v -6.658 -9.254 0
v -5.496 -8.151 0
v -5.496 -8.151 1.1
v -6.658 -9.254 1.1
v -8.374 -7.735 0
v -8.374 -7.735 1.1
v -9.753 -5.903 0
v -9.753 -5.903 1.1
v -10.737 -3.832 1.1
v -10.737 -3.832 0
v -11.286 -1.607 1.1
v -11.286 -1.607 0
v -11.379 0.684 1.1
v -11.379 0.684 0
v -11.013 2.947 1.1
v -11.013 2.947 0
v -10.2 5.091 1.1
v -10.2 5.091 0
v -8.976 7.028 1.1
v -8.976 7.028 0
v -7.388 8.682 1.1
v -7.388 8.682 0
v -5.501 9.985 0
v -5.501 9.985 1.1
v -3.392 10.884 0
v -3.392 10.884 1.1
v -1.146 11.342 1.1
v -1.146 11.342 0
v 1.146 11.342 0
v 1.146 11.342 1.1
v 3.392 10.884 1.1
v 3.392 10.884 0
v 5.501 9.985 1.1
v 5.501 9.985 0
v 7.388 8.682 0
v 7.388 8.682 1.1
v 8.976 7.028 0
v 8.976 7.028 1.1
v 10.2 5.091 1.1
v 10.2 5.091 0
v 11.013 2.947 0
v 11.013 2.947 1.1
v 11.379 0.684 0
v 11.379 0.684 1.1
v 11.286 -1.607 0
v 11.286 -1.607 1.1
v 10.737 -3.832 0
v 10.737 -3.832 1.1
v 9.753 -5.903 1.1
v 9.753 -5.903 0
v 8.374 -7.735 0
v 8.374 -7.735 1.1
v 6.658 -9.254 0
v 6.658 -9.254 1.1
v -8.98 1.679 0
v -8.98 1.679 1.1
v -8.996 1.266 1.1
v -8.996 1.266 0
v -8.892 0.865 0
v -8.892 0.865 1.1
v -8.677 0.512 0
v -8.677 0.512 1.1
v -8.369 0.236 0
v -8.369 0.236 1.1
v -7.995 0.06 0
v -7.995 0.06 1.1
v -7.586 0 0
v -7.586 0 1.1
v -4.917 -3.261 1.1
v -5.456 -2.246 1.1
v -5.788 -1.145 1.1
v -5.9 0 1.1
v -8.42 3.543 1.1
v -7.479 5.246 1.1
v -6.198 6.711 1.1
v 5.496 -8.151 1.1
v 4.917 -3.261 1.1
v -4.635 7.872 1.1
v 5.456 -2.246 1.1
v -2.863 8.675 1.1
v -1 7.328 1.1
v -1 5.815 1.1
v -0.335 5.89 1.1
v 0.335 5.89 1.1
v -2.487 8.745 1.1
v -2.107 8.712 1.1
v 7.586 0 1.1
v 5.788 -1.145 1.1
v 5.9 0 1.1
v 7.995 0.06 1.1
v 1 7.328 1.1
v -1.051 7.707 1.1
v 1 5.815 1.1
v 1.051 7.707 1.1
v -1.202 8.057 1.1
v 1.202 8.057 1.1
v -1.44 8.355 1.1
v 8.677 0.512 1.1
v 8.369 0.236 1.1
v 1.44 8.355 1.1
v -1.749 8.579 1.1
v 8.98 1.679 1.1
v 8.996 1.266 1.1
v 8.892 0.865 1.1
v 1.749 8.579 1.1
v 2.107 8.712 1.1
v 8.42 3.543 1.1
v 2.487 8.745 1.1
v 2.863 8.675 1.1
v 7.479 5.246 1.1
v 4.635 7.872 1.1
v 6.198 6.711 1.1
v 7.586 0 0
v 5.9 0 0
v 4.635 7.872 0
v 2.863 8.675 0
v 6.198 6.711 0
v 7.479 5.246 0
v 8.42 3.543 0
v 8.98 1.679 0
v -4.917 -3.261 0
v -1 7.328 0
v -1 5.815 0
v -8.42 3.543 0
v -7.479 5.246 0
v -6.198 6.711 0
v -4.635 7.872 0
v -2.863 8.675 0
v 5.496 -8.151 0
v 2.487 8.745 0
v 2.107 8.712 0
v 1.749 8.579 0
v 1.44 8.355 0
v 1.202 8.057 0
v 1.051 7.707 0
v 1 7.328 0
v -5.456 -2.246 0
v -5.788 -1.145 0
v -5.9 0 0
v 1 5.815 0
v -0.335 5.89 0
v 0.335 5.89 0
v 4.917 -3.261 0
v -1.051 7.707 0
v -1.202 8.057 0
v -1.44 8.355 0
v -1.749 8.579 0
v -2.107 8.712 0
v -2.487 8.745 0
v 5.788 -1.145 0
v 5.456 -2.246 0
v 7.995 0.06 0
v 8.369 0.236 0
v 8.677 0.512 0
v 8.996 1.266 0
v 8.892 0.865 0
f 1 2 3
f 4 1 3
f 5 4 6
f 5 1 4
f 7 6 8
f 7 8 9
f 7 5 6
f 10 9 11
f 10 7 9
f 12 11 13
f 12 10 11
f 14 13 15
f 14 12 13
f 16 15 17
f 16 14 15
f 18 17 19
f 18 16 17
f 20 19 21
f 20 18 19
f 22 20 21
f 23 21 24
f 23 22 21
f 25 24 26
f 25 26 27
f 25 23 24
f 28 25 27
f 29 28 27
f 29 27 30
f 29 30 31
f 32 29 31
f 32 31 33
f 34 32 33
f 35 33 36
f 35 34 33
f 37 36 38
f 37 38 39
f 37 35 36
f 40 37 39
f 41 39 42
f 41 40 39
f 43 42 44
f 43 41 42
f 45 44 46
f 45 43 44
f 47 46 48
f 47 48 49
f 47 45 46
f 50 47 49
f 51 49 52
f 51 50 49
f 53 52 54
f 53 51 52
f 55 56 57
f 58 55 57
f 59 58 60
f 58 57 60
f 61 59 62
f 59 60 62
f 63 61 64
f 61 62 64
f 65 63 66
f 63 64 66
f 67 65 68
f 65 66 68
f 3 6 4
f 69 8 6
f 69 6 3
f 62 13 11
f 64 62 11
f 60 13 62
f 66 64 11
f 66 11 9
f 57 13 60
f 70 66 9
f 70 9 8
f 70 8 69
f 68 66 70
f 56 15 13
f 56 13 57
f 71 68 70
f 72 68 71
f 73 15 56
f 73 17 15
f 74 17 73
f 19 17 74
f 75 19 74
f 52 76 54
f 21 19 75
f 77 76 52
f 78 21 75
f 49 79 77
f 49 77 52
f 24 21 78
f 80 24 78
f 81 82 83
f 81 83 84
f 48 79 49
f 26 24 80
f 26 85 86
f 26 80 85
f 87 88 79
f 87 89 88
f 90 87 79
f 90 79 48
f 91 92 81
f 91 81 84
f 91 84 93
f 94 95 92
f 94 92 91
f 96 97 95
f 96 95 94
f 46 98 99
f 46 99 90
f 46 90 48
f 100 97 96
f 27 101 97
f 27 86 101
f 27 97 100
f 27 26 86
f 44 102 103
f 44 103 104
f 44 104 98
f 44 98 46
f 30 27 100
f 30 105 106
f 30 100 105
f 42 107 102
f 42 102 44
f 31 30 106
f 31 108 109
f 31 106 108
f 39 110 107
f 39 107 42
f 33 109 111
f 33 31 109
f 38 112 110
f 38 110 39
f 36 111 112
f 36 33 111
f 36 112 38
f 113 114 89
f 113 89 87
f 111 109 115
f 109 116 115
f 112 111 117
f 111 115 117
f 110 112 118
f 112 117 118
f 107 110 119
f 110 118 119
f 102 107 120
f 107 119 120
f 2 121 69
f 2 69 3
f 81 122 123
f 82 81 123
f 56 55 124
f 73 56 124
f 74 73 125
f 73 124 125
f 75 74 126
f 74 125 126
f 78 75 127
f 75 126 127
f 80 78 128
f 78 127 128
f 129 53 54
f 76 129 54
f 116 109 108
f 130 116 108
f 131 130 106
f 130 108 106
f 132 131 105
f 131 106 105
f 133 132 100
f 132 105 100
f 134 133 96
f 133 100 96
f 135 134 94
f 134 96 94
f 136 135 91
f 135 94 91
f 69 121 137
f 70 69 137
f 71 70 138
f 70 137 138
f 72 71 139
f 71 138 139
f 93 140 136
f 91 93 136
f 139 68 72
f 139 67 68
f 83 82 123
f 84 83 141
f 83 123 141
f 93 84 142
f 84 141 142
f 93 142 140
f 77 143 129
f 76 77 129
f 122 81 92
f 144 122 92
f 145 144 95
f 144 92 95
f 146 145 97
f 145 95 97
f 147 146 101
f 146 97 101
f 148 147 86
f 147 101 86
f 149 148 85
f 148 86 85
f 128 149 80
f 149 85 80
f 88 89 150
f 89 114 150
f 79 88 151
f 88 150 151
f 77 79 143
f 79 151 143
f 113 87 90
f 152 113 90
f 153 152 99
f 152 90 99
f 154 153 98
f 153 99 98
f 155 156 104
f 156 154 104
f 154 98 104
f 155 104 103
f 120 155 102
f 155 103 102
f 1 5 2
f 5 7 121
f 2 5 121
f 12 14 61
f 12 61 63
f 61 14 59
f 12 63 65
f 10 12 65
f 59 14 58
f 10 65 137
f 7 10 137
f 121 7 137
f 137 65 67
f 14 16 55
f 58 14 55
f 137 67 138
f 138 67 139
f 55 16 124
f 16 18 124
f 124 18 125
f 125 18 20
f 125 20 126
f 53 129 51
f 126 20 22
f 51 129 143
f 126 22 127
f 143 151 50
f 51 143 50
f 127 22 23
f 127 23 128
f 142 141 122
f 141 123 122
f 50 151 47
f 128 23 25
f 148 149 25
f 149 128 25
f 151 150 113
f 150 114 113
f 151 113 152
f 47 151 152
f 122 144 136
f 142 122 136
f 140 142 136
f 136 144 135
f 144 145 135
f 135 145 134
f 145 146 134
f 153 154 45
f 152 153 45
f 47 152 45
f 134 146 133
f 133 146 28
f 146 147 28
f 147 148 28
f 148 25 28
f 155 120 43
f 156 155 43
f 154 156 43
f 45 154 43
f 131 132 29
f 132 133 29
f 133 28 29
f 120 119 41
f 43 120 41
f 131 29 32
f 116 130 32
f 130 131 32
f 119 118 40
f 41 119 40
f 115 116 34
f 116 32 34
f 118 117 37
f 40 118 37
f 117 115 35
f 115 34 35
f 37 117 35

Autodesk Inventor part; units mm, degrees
ref_plane "YZ Plane" through (0, 0, 0) normal (1, 0, 0) x (0, 1, 0)
ref_plane "XZ Plane" through (0, 0, 0) normal (0, 1, 0) x (-1, 0, 0)
ref_plane "XY Plane" through (0, 0, 0) normal (0, 0, 1) x (1, 0, 0)
sketch "Sketch1" plane through (0, 0, 0) normal (0, 0, 1) x (1, 0, 0)
  point P0 (0, 0)
sketch "Sketch2" plane through (0, 0, 0) normal (0, 0, 1) x (1, 0, 0)
  line L0 (-9.1353, 0) -> (-5.9, 0)
  arc A0 (-1, 9.0804) -> (-9.1353, 0) centre (0, 0) ccw
  line L1 (-1, 9.0804) -> (-1, 5.8146)
  arc A1 (1, 5.8146) -> (-1, 5.8146) centre (0, 0) ccw
  line L2 (1, 5.8146) -> (1, 9.0804)
  arc A2 (9.1353, 0) -> (1, 9.0804) centre (0, 0) ccw
  line L3 (5.9, 0) -> (9.1353, 0)
  arc A3 (4.9167, -3.2613) -> (5.9, 0) centre (0, 0) ccw
  line L4 (4.9167, -3.2613) -> (5.7, -9.8727)
  arc A4 (5.7, -9.8727) -> (-5.7, -9.8727) centre (0, 0) ccw
  line L5 (-4.9167, -3.2613) -> (-5.7, -9.8727)
  arc A5 (-5.9, 0) -> (-4.9167, -3.2613) centre (0, 0) ccw
  line L6 (-16.1, 0) -> (16.1, 0) projected
  line L7 (0, -14.2512) -> (0, 15.7919) projected
  dimension "d1" = 0
  dimension "d3" = 5.9
  dimension "d5" = 11.4
  dimension "d7" = 0
  dimension "d9" = 9.1353
  dimension "d11" = 1
  dimension "d13" = 1
  dimension "d15" = 5.7
  dimension "d17" = 5.7
  dimension "d19" = 9.8333
extrude "Extrusion1" add sketch "Sketch2" along normal blind 1.1 contours L6 A4 L7 A1 L1 A0 | L0 A5 L5 A4 L6 | A4 L6 A2 L2 A1 L7 | L3 L6 A4 L4 A3
fillet "Fillet1" radius 1.4182 4 edges at (-9.1353, 0, 0.55) (-1, 9.0804, 0.55) (1, 9.0804, 0.55) (9.1353, 0, 0.55)
chamfer "Chamfer1" distance 1.14 distance2 1.7333 1 edges at (-5.7, -9.8727, 0.55) measured on face at (9.3111, 6.5775, 0.3667)
chamfer "Chamfer2" distance 1.7333 distance2 1.14 1 edges at (5.7, -9.8727, 0.55) measured on face at (5.4389, -7.6689, 0.3667)
equation "\"d23\" = 0.05 * Diam3"
equation "\"d24\" = 0.222222 * Diam3 - 0.222222 * sd"
equation "\"d25\" = 0.222222 * Diam3 - 0.222222 * sd"
equation "\"d26\" = 0.05 * Diam3"
equation "\"d3\" = 0.5 * Diam"
equation "\"d5\" = 0.5 * Diam3"
equation "\"d9\" = 0.294118 * Diam3 + 0.205882 * Diam"
equation "\"d11\" = 0.0909091 * Diam3 - 0.0909091 * Diam"
equation "\"d13\" = 0.0909091 * Diam3 - 0.0909091 * Diam"
equation "\"d15\" = 0.25 * Diam3"
equation "\"d17\" = 0.25 * Diam3"
equation "\"d19\" = 0.833333 * Diam"
equation "\"d20\" = ParT"
equation "\"d22\" = 0.181818 * Diam3 - 0.181818 * sd"
equation "\"Diam3\" = 22.8"
equation "\"ParT\" = 1.1"
equation "\"Diam\" = 11.8"
equation "\"sd\" = 15"
equation "\"TEMPLATE\" = 1.2345"
properties part number "ANSI B27.7M - 3CMI-15" material "Steel, Mild"
